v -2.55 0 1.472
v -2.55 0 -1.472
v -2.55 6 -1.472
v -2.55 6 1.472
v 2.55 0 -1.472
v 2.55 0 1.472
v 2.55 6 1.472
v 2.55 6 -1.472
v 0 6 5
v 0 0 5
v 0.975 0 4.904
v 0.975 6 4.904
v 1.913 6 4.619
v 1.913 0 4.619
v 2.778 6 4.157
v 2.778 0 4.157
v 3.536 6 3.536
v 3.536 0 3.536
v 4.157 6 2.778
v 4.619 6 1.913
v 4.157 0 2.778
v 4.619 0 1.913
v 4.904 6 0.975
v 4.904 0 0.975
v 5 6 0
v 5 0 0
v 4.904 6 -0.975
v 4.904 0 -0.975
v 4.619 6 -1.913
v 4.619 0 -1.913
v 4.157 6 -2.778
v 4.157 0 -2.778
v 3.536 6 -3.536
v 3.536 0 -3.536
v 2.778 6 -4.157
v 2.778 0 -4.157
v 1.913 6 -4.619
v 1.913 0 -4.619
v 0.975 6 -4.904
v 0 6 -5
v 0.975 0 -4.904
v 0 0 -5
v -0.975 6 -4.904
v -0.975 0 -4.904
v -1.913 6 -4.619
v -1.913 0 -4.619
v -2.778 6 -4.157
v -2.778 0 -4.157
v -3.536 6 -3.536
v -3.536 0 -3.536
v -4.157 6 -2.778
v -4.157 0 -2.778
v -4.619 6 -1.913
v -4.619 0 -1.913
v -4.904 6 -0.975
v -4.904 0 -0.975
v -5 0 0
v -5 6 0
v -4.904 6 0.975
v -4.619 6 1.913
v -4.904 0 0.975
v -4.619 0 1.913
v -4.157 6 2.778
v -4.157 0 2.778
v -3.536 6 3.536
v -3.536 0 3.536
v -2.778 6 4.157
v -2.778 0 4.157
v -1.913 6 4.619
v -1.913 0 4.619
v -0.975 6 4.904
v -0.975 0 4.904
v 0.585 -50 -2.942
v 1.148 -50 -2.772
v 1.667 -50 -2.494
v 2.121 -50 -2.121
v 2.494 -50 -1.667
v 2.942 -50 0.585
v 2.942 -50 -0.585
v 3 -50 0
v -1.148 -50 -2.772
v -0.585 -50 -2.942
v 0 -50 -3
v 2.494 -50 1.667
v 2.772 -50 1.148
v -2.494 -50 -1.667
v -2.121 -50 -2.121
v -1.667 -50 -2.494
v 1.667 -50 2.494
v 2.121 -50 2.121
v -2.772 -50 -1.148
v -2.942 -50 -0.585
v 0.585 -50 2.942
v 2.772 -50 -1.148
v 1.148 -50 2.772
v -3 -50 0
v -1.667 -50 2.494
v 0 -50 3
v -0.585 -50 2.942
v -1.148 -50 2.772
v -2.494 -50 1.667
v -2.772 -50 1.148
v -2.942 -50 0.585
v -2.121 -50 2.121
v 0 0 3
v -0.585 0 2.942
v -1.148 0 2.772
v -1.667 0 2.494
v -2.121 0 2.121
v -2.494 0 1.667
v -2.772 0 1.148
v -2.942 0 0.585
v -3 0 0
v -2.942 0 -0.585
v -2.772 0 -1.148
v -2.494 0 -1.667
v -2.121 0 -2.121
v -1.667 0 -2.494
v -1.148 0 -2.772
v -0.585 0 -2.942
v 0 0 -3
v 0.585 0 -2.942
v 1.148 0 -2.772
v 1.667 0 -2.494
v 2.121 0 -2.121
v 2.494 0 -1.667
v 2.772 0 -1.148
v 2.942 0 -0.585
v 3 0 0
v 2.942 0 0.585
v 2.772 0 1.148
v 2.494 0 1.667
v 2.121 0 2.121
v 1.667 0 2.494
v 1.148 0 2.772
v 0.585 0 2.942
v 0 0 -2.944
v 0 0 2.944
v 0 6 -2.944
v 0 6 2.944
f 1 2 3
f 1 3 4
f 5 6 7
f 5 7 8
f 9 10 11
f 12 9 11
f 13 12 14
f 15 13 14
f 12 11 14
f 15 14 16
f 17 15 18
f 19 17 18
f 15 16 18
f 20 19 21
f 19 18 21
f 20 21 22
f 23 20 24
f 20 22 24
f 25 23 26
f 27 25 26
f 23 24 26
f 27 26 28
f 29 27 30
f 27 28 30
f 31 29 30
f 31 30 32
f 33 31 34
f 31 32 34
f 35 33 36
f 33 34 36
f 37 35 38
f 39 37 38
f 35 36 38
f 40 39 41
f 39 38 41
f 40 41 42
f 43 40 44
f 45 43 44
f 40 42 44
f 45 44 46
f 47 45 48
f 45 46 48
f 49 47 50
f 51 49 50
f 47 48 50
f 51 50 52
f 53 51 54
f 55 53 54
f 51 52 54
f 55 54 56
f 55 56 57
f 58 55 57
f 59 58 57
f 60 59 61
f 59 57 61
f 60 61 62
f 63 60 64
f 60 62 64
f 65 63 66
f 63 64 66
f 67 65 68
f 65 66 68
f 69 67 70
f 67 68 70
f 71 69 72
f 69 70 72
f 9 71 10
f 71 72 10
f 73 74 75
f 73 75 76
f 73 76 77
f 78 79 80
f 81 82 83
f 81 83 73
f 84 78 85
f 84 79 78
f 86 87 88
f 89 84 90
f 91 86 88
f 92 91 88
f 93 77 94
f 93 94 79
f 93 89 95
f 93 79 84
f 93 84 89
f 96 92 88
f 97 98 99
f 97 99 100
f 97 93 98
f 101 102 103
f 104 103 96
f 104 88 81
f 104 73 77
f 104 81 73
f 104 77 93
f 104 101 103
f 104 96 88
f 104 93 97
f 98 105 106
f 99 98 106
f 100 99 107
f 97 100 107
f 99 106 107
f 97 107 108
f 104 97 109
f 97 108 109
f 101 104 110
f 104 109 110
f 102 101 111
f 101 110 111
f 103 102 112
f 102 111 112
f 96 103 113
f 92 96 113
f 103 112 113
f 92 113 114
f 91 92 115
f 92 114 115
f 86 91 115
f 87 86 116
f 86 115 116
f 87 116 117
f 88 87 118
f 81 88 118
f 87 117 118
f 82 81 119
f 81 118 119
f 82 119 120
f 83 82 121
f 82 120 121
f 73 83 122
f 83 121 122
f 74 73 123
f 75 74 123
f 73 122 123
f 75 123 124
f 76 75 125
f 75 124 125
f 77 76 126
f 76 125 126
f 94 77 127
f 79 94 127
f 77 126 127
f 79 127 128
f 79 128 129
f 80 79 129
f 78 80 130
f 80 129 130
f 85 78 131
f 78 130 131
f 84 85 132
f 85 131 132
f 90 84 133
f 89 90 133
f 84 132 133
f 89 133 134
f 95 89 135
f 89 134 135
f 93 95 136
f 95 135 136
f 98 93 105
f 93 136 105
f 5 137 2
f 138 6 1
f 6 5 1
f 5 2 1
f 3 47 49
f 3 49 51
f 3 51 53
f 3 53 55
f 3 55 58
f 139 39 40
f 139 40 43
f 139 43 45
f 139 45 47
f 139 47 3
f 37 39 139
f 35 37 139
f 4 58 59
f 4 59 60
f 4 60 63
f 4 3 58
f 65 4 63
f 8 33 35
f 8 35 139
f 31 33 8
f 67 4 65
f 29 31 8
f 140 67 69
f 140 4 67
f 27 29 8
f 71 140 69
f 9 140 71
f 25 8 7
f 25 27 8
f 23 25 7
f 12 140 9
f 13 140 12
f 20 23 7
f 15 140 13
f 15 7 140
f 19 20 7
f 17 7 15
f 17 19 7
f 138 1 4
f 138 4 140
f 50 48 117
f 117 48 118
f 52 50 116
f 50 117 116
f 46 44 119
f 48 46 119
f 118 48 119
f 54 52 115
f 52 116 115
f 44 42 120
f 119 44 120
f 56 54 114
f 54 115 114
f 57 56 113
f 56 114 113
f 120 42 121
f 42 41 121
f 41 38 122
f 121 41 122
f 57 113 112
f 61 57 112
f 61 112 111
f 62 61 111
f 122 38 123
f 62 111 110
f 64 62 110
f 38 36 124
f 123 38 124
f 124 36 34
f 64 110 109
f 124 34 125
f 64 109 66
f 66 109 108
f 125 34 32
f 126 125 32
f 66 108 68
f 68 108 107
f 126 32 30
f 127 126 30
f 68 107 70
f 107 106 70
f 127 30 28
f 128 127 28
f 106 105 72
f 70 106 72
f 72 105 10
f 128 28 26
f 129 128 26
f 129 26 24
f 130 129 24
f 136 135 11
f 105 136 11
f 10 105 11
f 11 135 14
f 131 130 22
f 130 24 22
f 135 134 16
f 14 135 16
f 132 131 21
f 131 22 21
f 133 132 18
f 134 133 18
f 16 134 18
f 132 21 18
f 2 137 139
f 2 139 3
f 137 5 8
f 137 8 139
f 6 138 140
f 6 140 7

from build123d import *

# Parameters (mm, degrees)
SKETCH_1_R      = 5
EXTRUDE_1_DEPTH = 6
SKETCH_2_R      = 3
EXTRUDE_2_DEPTH = 50


with BuildPart() as part:
    # Эскиз1 → Вытянуть1 (new body)
    with BuildSketch(Plane(origin=(0, 0, 0), x_dir=(1, 0, 0), z_dir=(0, 1, 0))):
        with Locations(Location((0, 0, 0), (0, 0, 270))):
            Circle(SKETCH_1_R)
        Polygon((0, -2.944486373), (2.55, -1.472243186), (2.55, 1.472243186), (0, 2.944486373), (-2.55, 1.472243186), (-2.55, -1.472243186), align=None, mode=Mode.SUBTRACT)
    extrude(amount=EXTRUDE_1_DEPTH)

    # Эскиз2 → Вытянуть2 (add)
    with BuildSketch(Plane.XZ):
        with Locations(Location((0, 0, 0), (0, 0, 90))):
            Circle(SKETCH_2_R)
    extrude(amount=EXTRUDE_2_DEPTH)


solid = part.part
